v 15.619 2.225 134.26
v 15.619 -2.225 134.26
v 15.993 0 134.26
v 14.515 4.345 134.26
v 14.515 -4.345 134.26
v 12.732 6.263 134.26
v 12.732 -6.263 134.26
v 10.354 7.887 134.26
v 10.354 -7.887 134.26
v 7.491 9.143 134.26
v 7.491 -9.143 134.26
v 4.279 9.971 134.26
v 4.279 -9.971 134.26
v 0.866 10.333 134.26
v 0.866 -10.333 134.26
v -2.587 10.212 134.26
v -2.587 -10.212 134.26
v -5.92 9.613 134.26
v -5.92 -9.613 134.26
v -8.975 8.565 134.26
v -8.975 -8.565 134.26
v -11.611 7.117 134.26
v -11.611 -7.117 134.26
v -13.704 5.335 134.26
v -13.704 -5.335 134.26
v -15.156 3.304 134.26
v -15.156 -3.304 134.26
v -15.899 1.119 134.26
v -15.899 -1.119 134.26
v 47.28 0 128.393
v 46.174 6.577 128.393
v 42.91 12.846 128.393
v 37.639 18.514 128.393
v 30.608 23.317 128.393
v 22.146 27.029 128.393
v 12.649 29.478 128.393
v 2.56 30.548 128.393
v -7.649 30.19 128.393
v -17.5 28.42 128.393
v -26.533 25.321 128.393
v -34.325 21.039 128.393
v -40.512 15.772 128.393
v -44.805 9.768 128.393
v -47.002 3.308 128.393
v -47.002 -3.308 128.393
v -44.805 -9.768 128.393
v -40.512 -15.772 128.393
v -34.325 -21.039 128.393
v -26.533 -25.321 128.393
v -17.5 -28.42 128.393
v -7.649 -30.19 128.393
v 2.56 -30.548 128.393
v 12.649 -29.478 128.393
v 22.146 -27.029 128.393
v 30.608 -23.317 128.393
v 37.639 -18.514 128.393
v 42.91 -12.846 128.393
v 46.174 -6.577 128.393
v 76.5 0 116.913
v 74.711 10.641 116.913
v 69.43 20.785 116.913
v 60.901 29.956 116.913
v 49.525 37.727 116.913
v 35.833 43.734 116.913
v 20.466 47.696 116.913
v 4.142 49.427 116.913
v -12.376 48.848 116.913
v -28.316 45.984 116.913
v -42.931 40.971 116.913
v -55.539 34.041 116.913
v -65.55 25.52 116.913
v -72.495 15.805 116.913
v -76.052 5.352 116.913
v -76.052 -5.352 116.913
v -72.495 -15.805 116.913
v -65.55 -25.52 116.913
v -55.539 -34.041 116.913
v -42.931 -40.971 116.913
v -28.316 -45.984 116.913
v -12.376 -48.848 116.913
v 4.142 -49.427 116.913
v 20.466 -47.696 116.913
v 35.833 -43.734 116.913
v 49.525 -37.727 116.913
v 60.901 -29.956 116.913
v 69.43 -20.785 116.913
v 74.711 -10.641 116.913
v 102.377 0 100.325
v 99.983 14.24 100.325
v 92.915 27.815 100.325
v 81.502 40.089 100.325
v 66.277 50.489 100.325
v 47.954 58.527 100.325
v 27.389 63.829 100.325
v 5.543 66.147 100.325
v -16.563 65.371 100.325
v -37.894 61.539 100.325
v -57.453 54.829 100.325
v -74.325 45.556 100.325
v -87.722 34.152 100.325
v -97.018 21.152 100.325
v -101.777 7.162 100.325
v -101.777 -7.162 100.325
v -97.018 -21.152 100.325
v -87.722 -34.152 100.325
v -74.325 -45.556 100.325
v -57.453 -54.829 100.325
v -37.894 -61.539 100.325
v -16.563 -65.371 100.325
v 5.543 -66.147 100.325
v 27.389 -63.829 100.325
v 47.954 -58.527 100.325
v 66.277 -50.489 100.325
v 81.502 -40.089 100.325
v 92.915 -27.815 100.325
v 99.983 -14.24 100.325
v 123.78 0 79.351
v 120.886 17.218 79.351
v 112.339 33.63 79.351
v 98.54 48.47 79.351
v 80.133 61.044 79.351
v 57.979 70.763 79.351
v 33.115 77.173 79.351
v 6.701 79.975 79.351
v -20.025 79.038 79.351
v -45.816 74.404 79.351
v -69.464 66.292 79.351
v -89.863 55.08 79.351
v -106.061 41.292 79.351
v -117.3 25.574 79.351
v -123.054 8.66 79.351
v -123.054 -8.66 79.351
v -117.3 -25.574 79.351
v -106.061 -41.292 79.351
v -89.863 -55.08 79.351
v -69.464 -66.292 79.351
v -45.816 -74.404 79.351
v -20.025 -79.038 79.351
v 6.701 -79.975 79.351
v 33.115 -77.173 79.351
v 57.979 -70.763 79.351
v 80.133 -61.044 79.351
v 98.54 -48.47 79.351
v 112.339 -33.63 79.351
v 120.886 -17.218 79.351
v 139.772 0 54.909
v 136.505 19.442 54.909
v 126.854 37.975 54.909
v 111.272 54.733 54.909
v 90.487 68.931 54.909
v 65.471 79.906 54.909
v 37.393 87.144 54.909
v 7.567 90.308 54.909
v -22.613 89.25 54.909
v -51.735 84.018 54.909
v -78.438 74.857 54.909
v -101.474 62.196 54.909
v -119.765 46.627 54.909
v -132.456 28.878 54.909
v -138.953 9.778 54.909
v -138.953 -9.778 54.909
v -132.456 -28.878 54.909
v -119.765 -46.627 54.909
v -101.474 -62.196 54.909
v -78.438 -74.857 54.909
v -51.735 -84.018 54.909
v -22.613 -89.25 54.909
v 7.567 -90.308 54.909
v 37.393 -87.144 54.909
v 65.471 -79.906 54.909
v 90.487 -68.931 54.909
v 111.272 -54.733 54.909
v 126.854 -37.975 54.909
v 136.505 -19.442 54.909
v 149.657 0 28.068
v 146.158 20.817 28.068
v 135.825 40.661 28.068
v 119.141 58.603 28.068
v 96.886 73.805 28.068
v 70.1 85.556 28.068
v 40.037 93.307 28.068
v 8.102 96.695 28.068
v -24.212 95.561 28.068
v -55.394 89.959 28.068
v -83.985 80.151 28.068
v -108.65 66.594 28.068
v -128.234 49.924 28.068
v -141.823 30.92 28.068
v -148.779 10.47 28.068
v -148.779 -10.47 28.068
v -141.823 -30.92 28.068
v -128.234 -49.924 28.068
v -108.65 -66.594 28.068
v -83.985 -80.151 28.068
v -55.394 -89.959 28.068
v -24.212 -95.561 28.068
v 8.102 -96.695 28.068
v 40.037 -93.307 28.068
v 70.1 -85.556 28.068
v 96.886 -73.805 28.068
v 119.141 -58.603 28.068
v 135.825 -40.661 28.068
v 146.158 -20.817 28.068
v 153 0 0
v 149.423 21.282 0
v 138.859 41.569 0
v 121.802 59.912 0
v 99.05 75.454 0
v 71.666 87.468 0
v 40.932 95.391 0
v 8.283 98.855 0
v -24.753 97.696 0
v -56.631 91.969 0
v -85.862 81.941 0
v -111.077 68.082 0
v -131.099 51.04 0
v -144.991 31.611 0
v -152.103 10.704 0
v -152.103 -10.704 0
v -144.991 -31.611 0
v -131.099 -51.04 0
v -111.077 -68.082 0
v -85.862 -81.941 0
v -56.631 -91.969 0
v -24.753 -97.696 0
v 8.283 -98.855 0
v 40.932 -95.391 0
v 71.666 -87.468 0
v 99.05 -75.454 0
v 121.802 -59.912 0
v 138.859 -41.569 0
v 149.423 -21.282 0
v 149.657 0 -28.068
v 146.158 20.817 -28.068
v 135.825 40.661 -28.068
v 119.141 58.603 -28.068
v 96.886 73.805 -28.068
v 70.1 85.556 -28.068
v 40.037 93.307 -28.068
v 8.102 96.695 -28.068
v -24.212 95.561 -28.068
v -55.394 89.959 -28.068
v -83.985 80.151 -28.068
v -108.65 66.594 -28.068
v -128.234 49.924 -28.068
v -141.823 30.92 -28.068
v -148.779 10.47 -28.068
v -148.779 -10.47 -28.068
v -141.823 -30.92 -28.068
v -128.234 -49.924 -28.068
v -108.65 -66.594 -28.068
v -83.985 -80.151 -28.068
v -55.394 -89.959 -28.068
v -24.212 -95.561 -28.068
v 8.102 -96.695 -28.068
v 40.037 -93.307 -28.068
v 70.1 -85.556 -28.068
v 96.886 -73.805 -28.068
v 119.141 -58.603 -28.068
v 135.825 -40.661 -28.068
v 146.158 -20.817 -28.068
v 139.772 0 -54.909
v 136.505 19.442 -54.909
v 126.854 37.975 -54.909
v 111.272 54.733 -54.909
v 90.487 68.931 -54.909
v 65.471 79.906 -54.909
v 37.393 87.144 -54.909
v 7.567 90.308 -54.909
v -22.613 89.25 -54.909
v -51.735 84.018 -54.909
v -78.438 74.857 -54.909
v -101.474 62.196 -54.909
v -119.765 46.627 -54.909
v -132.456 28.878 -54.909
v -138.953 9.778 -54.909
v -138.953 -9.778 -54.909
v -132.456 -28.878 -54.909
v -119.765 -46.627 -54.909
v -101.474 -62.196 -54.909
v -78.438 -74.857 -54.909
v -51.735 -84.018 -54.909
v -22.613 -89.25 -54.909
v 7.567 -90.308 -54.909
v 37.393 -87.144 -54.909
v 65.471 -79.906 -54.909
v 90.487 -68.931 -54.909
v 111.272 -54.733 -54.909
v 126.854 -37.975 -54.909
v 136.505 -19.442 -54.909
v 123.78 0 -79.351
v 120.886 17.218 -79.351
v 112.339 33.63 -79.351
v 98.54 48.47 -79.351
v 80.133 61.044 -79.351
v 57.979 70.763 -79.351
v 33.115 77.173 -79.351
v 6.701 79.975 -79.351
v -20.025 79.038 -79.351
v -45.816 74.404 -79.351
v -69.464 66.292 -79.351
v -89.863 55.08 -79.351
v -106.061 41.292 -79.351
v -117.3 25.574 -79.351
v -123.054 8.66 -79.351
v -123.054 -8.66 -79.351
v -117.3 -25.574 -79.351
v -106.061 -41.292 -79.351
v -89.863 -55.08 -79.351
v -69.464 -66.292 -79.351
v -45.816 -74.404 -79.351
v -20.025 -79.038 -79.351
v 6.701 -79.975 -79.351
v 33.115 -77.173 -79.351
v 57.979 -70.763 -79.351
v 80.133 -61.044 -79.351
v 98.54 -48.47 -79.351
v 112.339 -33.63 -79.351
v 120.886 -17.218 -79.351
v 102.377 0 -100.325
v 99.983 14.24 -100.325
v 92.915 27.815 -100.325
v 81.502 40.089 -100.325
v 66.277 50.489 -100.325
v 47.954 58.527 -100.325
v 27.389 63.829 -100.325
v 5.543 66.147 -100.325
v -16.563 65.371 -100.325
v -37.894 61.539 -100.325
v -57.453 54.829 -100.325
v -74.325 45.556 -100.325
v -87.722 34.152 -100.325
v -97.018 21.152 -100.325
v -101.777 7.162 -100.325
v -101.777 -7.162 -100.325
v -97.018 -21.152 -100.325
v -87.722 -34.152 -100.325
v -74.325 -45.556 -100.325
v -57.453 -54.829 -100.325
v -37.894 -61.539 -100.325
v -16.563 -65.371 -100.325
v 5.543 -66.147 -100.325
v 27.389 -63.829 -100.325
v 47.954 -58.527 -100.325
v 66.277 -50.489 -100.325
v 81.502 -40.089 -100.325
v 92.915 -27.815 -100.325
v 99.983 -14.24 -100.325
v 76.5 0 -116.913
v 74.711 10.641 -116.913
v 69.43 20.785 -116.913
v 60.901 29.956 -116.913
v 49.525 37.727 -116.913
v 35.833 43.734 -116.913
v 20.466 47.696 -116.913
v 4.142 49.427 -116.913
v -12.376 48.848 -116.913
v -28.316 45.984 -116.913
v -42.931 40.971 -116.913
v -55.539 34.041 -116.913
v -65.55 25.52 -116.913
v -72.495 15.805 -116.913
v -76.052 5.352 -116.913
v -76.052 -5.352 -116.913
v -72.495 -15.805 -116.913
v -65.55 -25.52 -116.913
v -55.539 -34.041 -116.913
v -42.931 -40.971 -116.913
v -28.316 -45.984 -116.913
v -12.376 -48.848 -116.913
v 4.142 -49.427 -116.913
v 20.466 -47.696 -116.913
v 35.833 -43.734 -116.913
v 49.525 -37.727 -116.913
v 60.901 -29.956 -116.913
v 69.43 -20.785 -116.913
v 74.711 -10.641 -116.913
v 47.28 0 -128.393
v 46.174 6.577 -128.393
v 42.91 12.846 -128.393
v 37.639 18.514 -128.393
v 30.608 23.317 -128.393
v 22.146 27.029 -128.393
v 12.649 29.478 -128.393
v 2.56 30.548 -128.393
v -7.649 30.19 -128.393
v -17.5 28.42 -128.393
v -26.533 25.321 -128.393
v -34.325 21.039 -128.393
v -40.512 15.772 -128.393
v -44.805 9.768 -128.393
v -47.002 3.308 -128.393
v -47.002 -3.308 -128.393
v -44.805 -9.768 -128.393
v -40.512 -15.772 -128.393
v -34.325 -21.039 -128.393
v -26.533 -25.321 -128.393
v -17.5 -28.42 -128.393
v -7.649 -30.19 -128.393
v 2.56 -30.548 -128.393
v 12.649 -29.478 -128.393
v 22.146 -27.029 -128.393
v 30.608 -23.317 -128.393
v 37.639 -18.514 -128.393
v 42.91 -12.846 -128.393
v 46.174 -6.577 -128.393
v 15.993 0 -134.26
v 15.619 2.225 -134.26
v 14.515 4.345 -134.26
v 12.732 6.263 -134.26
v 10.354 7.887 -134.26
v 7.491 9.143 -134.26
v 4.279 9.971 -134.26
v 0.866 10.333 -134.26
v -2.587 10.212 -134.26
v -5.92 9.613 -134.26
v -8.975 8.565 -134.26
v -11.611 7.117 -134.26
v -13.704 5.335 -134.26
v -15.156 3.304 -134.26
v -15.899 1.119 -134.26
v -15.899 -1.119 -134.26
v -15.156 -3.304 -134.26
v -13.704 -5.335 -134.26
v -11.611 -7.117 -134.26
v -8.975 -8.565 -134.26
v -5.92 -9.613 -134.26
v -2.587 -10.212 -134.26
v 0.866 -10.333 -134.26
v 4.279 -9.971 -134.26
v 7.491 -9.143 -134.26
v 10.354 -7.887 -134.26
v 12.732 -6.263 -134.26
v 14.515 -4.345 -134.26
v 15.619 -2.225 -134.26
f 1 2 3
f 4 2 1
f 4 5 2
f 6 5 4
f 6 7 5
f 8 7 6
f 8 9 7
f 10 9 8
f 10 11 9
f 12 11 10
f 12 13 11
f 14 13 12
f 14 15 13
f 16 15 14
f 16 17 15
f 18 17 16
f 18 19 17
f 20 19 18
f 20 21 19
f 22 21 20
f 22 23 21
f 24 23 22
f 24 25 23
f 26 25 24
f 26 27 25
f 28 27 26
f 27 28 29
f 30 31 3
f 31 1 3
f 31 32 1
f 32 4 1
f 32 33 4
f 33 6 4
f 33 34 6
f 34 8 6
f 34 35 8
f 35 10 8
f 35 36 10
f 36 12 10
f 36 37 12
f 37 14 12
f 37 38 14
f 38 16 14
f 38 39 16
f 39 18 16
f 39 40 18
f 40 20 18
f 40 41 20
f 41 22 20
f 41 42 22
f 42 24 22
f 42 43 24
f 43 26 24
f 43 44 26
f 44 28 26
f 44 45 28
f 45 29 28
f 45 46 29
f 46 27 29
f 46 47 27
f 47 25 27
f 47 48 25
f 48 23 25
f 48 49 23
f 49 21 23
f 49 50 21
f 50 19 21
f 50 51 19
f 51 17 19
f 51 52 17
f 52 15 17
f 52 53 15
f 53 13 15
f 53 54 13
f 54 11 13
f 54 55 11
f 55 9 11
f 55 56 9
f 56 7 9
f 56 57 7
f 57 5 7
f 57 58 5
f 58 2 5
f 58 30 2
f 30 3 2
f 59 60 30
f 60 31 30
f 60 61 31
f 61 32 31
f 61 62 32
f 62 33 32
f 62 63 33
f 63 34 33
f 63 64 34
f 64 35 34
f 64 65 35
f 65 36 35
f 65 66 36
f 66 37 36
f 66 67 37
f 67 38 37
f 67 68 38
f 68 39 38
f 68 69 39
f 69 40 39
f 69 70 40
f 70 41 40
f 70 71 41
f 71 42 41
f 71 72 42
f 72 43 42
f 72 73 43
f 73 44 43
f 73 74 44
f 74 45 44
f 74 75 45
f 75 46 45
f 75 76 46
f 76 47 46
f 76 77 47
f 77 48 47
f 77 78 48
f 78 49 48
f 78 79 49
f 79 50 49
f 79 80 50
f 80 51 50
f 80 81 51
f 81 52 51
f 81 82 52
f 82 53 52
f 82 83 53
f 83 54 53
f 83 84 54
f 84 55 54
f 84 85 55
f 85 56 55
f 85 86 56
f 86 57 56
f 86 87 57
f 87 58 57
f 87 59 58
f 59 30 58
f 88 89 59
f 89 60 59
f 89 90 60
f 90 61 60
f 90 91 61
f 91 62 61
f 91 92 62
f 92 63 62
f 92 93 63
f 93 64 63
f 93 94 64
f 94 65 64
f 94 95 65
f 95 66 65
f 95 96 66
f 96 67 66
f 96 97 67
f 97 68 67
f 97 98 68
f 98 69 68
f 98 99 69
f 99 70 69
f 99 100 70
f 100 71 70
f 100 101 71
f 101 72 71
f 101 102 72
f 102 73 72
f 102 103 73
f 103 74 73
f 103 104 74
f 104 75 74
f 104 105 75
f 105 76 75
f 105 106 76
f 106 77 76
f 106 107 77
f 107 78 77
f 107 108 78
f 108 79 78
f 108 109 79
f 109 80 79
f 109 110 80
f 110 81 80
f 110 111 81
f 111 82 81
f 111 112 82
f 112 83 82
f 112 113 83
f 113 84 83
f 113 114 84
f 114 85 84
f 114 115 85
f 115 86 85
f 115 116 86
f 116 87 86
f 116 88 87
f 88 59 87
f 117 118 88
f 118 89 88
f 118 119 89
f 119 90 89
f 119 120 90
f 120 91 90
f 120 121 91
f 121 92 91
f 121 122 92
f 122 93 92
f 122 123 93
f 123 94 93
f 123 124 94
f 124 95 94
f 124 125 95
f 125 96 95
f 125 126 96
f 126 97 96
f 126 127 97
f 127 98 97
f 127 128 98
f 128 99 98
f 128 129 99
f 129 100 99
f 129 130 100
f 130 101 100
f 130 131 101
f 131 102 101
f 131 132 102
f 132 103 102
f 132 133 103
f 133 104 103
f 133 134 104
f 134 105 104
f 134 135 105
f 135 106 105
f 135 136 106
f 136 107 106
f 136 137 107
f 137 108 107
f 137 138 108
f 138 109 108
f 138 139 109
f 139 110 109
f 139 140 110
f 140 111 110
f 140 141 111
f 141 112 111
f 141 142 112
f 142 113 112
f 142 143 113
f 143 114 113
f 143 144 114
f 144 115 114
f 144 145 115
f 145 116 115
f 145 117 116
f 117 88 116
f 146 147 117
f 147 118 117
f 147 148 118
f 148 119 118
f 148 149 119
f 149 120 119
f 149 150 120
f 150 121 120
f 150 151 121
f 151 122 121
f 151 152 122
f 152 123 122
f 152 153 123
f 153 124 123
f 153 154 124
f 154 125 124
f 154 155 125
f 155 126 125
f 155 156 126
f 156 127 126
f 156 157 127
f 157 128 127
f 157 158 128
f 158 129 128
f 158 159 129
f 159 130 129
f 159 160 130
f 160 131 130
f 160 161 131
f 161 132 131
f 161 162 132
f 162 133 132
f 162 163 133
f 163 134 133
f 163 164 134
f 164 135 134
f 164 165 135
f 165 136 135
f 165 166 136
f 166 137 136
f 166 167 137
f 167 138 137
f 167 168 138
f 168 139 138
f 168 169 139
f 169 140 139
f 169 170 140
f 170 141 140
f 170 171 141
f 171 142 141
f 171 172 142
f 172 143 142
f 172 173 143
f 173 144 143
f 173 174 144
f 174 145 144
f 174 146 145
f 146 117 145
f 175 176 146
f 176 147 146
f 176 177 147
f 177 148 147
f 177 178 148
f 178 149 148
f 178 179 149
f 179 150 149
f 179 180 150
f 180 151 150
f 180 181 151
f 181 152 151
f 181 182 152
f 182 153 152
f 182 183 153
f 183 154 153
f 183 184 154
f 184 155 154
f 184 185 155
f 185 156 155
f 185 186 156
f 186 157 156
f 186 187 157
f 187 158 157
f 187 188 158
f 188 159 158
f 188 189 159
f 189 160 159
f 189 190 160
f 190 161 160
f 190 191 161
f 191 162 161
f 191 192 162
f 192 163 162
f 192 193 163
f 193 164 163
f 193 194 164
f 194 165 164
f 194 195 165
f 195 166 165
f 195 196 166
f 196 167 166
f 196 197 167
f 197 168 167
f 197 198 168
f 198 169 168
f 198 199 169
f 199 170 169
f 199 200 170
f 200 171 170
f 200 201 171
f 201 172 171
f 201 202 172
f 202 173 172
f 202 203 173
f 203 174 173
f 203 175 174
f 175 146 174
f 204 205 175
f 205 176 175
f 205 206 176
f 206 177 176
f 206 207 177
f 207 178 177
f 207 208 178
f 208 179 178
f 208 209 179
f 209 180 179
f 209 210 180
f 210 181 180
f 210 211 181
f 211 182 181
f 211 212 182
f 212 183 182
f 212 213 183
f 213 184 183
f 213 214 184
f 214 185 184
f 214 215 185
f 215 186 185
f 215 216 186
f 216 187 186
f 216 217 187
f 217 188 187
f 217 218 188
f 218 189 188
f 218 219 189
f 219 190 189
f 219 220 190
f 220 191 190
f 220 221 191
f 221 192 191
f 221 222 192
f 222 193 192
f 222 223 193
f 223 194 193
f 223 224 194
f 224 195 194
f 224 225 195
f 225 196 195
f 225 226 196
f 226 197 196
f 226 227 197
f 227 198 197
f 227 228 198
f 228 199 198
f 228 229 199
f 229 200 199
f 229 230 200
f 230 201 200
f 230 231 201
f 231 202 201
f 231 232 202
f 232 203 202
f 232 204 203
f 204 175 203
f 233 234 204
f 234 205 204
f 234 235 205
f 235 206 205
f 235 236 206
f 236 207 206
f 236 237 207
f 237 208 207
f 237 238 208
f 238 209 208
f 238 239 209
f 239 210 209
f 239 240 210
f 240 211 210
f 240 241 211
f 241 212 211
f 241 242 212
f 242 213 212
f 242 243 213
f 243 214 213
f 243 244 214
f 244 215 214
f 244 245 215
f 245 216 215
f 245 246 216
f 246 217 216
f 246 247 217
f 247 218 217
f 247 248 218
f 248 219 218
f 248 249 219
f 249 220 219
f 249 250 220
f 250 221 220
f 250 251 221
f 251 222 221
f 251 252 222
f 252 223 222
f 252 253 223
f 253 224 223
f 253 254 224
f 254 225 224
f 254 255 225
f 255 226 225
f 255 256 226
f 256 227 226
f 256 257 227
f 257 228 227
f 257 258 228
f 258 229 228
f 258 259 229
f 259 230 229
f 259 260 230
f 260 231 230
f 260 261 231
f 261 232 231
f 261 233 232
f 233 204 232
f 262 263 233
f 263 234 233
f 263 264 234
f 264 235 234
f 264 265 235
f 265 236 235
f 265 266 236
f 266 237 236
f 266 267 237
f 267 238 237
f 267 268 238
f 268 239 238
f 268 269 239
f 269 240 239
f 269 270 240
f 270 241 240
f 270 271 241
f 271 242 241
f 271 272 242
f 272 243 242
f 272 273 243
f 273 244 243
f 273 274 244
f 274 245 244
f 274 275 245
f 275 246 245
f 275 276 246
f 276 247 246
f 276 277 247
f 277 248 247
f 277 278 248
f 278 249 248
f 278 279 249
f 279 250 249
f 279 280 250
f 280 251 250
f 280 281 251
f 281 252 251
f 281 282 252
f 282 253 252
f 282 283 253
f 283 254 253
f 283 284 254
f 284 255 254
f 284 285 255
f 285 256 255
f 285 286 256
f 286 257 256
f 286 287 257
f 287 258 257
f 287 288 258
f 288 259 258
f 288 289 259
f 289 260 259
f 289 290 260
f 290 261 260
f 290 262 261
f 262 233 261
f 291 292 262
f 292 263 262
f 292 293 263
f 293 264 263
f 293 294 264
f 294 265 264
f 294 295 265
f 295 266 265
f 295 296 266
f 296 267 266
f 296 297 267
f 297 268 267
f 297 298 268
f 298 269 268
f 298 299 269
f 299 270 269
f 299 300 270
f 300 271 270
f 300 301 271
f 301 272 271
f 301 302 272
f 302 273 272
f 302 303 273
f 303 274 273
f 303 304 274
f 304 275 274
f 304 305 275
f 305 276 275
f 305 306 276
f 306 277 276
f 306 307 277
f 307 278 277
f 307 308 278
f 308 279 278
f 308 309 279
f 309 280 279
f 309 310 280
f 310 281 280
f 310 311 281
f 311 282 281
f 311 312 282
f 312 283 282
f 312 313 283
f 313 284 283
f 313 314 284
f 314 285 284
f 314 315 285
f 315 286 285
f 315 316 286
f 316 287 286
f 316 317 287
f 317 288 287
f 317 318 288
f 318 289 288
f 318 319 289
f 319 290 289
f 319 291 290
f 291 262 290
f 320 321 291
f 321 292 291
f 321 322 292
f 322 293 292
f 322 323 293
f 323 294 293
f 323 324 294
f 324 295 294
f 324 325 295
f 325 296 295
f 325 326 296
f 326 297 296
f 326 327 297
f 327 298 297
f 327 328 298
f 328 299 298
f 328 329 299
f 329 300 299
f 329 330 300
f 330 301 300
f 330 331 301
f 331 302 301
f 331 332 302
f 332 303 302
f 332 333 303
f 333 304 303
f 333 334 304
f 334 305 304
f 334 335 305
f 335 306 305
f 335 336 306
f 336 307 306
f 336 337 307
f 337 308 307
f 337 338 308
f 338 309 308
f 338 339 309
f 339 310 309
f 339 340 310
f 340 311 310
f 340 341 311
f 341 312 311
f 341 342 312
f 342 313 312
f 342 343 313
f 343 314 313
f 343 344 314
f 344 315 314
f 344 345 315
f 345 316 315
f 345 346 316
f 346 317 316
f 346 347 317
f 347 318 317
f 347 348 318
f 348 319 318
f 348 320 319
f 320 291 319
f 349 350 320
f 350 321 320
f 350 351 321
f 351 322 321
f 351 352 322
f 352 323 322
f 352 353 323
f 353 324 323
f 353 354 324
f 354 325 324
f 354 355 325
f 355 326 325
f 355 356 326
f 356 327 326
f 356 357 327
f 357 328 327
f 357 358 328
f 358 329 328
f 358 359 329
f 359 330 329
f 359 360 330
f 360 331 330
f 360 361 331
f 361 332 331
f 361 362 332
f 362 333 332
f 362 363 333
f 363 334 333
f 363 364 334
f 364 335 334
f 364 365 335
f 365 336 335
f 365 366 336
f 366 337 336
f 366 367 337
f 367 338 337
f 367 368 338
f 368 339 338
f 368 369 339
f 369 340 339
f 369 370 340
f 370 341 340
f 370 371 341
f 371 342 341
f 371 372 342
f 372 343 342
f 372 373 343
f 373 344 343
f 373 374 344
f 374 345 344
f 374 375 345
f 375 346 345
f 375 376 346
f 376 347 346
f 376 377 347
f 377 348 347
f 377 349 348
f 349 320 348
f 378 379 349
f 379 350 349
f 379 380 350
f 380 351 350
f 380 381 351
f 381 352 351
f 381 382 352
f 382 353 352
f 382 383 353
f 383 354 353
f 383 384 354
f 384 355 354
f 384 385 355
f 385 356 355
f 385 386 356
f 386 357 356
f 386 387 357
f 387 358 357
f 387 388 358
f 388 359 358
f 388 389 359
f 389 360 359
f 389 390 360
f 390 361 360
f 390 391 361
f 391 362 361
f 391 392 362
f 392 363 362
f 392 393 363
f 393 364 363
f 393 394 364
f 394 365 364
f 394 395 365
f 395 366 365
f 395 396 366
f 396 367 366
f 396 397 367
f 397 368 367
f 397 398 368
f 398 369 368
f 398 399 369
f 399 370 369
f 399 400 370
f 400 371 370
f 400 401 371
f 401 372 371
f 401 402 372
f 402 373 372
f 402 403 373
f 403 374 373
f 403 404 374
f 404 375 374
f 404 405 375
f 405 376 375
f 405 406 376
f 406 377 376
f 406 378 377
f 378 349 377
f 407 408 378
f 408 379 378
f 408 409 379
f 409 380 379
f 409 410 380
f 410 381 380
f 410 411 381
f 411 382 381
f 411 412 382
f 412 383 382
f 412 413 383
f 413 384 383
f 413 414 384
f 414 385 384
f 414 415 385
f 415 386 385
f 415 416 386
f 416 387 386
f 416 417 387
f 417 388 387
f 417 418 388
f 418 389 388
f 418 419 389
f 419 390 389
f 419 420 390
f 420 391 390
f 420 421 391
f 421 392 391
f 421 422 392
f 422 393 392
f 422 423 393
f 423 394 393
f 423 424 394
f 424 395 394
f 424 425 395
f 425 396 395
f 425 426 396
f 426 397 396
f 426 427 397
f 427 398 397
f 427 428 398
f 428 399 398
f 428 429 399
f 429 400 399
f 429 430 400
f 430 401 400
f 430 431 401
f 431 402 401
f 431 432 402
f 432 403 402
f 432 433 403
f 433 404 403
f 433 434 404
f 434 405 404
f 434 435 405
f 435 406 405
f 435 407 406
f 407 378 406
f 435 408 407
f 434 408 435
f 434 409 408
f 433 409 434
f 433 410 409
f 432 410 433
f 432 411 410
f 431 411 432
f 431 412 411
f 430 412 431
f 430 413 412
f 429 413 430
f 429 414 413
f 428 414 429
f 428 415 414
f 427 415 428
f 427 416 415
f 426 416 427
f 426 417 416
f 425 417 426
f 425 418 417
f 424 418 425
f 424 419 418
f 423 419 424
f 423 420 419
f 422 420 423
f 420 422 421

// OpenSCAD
// Generated by SolidPython 1.0.1 on 2020-07-29 00:46:53


scale(v = [17, 11, 15]) {
	sphere(r = 9);
}
/***********************************************
*********      SolidPython code:      **********
************************************************
 
# import packages: SolidPython
from solid import *
from solid.utils import *
from itertools import chain, combinations, permutations


class Resize:

    def __init__(self, scad_file):
        self.scad_file = scad_file
        #self.scad_file = import_scad(scad_file)
        # cone/cylinder param:
        self.r1 = 0
        self.r2 = 0
        self.h = 0
        # rectangular prism param:
        self.w = 0
        self.l = 0
        # ellipse param:
        self.r = 0

    # import OpenScad code (file name corresponds to shape)


    # classify shape + parameters
    def assign(self, param1, param2, param3):
        if self.scad_file == 'cone.scad':
            self.r1 = param1
            self.r2 = param2
            self.h = param3
        elif self.scad_file == 'cylinder.scad':
            self.r1 = param1
            self.r2 = param2
            self.h = param3
        elif self.scad_file == 'rectangularPrism.scad':
            self.h = param1
            self.l = param2
            self.w = param3
        else:
            self.r = param1
            self.h = param2

    # resize parameters
    def iterate(self):
        x = range(3, 20, 2)
        i = 1
        if self.scad_file == 'cone.scad':
            tempList = list(permutations(x, 2))
            for temp in tempList:
                param1 = temp[0]
                param2 = temp[1]
                filepath = 'produced_scad_files/' + 'cone' + str(param1) + '_' + str(param2) + '_' + '.scad'
                scad_render_to_file(cylinder(h=param1, r1=param2, r2=0), filepath)

        elif self.scad_file == 'cylinder.scad':
            tempList = list(permutations(x, 3))
            for temp in tempList:
                param1 = temp[0]
                param2 = temp[1]
                filepath = 'produced_scad_files/' + 'cylinder' + str(param1) + '_' + str(param2) + '_' + '.scad'
                scad_render_to_file(cylinder(h=param1, r1=param2, r2=param2), filepath)

        elif self.scad_file == 'rectangularPrism.scad':
            tempList = list(permutations(x, 3))
            for temp in tempList:
                param1 = temp[0]
                param2 = temp[1]
                param3 = temp[2]
                filepath = 'produced_scad_files/' + 'rectangularPrism' + str(param1) + '_' + str(param2) + '_' + str(
                    param3) + '.scad'
                scad_render_to_file(cube(size=(param1, param2, param3)), filepath)

        elif self.scad_file == 'ellipse.scad':
            tempList = list(permutations(x, 4))
            for temp in tempList:
                param1 = temp[0]
                param2 = temp[1]
                param3 = temp[2]
                param4 = temp[3]
                filepath = 'produced_scad_files/' + 'ellipse' + str(param1) + '_' + str(param2) + '_' + str(param3) + '_' + str(param4) + '.scad'
                scad_render_to_file(scale([param1, param2, param3])(sphere(r=param4)), filepath)

    def render_to_scadfile(self):
        scad_render_to_file(scad, 'example.scad') 
 
************************************************/
